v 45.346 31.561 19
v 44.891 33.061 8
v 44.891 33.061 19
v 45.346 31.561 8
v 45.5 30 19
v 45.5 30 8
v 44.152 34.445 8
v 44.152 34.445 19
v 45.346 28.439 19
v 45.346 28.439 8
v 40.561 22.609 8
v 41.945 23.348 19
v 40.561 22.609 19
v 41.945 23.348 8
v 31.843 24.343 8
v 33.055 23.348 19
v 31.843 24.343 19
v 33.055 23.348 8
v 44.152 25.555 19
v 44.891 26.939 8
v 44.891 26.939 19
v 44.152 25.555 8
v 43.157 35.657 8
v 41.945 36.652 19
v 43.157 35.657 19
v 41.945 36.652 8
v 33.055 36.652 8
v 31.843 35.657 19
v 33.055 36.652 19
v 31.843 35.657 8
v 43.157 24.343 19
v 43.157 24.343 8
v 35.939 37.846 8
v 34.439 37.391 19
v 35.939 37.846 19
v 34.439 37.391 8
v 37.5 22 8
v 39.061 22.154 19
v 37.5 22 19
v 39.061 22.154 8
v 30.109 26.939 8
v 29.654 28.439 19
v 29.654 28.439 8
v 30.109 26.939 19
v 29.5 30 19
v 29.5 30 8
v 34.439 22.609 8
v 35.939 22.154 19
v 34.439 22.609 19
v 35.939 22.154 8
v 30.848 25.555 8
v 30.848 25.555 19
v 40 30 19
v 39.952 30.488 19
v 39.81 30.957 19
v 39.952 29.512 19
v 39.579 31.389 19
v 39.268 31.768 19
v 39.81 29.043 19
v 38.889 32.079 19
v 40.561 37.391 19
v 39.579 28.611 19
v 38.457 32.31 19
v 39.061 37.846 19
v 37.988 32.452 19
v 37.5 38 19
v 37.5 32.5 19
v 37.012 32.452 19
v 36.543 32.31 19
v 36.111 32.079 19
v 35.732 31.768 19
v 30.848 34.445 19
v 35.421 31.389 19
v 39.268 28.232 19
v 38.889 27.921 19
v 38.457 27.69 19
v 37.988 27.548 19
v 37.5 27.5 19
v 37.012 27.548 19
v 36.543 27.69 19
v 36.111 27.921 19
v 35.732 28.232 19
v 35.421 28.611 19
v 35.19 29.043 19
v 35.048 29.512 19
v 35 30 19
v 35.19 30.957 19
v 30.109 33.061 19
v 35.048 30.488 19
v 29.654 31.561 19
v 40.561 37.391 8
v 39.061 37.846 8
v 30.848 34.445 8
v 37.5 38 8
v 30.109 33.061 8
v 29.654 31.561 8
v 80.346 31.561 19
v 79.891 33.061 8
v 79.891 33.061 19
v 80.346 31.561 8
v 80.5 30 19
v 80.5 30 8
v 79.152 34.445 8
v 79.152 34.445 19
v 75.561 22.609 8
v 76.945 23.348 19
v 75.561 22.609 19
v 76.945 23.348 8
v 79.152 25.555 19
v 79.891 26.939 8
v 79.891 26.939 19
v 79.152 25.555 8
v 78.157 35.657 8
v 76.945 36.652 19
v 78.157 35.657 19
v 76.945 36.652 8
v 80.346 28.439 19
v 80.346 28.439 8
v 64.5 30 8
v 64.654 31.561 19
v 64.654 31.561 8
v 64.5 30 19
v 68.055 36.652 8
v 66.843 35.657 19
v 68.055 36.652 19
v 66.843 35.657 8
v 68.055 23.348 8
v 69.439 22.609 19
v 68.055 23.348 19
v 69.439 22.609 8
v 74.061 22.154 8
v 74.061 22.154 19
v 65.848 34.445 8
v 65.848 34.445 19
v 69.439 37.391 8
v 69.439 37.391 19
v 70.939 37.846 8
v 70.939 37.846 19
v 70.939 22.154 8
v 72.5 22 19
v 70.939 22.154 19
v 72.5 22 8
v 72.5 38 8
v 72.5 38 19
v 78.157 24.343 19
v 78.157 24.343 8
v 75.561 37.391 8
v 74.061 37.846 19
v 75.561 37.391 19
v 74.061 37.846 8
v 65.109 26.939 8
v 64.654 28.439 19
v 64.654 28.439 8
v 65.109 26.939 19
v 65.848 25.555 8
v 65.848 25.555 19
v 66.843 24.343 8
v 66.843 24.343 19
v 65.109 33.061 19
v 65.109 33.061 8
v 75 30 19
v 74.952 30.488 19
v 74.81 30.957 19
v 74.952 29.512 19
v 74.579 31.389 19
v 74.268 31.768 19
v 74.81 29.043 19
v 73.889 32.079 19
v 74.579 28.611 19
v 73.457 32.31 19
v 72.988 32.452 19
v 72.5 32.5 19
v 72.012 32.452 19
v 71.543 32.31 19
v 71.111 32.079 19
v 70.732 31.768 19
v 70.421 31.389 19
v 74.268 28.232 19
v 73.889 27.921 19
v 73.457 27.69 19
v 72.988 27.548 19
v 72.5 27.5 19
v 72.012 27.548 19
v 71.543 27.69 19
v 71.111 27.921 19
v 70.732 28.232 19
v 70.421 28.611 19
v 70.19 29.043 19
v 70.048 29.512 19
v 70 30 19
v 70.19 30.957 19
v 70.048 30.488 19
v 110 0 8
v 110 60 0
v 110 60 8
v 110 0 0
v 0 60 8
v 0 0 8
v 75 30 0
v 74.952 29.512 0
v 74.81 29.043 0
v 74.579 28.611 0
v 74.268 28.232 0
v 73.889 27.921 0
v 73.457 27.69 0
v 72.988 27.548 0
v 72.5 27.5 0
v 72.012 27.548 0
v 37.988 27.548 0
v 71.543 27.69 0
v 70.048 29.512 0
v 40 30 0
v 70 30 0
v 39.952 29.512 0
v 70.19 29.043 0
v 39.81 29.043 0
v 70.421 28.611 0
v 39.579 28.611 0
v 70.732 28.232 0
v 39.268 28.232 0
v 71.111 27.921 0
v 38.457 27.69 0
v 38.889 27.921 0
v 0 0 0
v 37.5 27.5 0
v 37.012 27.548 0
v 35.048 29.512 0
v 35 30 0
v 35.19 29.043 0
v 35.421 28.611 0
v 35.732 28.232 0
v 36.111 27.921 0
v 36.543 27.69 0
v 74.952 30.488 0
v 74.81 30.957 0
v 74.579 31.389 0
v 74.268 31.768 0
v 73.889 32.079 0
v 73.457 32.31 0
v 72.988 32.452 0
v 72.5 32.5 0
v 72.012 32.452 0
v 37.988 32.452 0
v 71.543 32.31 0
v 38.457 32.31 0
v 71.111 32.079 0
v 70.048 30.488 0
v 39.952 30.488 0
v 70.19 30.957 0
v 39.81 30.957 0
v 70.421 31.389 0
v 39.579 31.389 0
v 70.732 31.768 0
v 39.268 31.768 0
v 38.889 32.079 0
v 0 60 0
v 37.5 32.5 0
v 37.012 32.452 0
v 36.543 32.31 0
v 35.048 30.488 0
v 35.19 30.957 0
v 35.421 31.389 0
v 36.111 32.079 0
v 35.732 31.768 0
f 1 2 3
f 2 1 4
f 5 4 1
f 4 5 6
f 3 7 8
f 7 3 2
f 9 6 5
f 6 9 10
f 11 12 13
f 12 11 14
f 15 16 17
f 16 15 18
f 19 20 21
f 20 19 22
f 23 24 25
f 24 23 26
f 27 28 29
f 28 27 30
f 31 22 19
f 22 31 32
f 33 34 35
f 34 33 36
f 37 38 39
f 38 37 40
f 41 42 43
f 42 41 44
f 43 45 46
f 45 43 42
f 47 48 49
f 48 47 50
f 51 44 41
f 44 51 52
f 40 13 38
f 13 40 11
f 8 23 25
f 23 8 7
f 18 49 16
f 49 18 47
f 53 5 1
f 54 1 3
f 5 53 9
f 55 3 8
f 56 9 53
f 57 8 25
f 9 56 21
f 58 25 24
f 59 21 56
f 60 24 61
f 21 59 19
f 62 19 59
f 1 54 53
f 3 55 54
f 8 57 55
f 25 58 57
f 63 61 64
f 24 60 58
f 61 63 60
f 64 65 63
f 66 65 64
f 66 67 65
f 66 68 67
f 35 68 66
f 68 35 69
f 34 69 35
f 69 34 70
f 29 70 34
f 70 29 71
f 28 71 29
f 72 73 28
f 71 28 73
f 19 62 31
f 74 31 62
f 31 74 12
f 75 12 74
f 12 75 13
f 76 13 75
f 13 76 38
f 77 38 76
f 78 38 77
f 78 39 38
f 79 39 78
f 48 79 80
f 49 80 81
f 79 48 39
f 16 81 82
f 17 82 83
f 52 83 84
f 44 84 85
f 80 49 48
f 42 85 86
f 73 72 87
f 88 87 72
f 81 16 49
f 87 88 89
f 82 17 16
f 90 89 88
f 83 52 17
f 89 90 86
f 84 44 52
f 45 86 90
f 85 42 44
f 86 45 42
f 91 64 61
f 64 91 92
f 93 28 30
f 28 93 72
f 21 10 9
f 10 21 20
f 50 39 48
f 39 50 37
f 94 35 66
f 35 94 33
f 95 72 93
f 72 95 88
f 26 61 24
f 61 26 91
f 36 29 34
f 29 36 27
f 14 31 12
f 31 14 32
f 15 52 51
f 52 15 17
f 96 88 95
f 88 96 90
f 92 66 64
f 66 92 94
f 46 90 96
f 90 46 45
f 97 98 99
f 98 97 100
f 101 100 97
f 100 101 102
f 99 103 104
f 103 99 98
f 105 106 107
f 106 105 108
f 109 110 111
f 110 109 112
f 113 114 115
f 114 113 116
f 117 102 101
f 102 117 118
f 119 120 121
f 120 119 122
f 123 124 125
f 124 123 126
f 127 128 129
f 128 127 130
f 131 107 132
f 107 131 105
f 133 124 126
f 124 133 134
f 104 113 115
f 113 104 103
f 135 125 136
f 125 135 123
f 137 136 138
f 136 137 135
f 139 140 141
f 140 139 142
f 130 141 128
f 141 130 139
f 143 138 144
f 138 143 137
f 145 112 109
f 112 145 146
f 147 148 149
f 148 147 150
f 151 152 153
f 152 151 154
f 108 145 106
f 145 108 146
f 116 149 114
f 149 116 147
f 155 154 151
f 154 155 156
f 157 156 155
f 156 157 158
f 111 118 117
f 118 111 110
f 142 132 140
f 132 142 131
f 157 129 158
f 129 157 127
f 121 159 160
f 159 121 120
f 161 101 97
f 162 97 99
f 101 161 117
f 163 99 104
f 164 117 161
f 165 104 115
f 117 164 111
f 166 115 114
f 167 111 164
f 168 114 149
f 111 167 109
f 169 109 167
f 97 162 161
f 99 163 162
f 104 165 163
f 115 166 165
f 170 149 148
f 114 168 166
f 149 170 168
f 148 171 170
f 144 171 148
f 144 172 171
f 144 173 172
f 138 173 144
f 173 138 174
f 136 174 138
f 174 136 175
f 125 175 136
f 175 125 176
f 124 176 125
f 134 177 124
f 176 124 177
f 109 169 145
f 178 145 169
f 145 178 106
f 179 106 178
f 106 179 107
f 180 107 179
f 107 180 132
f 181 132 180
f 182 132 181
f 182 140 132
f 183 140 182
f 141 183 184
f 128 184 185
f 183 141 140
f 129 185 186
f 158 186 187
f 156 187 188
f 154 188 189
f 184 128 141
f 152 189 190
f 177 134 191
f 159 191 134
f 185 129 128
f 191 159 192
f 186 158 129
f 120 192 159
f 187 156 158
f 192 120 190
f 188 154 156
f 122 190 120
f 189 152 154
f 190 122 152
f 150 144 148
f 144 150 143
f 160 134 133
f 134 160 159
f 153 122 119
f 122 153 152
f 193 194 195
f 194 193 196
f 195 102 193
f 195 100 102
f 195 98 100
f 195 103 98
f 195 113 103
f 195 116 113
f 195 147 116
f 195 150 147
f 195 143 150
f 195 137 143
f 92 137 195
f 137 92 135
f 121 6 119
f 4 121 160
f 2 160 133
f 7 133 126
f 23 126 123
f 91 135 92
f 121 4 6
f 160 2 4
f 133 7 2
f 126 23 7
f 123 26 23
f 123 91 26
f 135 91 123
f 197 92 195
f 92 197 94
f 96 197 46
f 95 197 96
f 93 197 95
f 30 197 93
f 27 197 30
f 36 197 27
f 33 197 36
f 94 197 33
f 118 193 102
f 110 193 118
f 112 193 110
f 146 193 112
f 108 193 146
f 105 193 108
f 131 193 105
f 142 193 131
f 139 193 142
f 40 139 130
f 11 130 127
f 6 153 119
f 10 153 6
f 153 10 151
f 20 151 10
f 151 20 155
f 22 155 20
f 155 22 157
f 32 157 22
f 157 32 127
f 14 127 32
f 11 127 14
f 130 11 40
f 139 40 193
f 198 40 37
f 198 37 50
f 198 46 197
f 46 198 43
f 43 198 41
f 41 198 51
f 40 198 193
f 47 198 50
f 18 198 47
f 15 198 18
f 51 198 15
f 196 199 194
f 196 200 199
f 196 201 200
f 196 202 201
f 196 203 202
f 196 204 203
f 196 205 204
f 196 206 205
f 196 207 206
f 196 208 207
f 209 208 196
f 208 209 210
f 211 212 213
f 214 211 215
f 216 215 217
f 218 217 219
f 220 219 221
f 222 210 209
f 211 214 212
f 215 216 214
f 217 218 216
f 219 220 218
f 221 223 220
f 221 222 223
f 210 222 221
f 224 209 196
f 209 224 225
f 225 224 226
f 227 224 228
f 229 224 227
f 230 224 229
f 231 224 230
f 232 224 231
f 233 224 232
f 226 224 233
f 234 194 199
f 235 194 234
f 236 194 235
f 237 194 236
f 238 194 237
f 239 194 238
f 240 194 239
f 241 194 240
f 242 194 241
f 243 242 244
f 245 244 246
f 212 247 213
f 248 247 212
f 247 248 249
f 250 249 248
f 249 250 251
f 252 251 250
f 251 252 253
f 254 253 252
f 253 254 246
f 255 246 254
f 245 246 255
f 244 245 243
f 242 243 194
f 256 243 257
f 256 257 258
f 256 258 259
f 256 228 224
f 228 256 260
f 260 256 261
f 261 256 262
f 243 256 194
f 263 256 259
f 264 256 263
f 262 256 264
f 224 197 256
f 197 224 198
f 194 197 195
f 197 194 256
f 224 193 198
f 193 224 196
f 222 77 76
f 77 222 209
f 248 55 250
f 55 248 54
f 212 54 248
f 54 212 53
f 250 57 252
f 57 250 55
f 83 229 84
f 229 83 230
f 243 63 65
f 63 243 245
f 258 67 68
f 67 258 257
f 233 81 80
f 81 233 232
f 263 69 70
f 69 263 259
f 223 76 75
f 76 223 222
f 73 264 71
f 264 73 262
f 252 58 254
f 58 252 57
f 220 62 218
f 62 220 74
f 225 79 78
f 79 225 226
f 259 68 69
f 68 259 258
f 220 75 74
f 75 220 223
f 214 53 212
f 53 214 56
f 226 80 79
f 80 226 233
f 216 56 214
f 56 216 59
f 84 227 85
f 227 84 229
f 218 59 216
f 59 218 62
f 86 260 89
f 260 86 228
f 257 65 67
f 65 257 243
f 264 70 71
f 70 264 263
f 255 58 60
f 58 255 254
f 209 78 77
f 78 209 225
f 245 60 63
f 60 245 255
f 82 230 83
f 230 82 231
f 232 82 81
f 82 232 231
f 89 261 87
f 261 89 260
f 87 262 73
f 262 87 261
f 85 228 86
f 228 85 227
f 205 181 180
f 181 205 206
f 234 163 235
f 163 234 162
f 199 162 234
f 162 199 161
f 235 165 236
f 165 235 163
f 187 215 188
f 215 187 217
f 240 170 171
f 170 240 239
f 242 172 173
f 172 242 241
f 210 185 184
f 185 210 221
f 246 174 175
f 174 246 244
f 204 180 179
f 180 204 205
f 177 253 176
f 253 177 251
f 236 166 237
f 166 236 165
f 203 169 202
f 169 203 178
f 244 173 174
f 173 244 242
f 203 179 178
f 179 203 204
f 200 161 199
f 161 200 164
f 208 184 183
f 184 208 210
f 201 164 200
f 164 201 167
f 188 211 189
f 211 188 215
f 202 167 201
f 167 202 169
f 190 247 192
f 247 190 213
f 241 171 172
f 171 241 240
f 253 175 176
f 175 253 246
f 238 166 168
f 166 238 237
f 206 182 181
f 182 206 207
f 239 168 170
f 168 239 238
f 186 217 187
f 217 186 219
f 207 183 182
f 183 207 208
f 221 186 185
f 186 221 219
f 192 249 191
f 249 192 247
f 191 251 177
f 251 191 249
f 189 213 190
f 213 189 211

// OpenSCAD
$fn = 32;

// ----------------------------------------------------------------------
// Drill jig: two_boss jig
// ----------------------------------------------------------------------

// --- parameters (mm) ---
plate_l = 110;            // plate length, X
plate_w = 60;             // plate width, Y
plate_t = 8;              // plate thickness
boss_d = 16;              // guide boss diameter
boss_h = 12;              // boss height above the plate
guide_d = 5;              // guide hole diameter
boss_pitch = 35;          // boss pitch

n_boss = 2;  // guide bosses
boss_x0 = (plate_l - (n_boss - 1) * boss_pitch) / 2;  // first boss X
boss_top = plate_t - 1 + boss_h;  // boss crown height
total_h = boss_top;  // overall height

difference() {
  union() {
  cube([plate_l, plate_w, plate_t]);
  for (i = [0 : n_boss - 1])
    translate([boss_x0 + i * boss_pitch, plate_w / 2, plate_t - 1])
      cylinder(h = boss_h, d = boss_d);
  }
  for (i = [0 : n_boss - 1])
    translate([boss_x0 + i * boss_pitch, plate_w / 2, -1])
      cylinder(h = plate_t + boss_h, d = guide_d);
}
